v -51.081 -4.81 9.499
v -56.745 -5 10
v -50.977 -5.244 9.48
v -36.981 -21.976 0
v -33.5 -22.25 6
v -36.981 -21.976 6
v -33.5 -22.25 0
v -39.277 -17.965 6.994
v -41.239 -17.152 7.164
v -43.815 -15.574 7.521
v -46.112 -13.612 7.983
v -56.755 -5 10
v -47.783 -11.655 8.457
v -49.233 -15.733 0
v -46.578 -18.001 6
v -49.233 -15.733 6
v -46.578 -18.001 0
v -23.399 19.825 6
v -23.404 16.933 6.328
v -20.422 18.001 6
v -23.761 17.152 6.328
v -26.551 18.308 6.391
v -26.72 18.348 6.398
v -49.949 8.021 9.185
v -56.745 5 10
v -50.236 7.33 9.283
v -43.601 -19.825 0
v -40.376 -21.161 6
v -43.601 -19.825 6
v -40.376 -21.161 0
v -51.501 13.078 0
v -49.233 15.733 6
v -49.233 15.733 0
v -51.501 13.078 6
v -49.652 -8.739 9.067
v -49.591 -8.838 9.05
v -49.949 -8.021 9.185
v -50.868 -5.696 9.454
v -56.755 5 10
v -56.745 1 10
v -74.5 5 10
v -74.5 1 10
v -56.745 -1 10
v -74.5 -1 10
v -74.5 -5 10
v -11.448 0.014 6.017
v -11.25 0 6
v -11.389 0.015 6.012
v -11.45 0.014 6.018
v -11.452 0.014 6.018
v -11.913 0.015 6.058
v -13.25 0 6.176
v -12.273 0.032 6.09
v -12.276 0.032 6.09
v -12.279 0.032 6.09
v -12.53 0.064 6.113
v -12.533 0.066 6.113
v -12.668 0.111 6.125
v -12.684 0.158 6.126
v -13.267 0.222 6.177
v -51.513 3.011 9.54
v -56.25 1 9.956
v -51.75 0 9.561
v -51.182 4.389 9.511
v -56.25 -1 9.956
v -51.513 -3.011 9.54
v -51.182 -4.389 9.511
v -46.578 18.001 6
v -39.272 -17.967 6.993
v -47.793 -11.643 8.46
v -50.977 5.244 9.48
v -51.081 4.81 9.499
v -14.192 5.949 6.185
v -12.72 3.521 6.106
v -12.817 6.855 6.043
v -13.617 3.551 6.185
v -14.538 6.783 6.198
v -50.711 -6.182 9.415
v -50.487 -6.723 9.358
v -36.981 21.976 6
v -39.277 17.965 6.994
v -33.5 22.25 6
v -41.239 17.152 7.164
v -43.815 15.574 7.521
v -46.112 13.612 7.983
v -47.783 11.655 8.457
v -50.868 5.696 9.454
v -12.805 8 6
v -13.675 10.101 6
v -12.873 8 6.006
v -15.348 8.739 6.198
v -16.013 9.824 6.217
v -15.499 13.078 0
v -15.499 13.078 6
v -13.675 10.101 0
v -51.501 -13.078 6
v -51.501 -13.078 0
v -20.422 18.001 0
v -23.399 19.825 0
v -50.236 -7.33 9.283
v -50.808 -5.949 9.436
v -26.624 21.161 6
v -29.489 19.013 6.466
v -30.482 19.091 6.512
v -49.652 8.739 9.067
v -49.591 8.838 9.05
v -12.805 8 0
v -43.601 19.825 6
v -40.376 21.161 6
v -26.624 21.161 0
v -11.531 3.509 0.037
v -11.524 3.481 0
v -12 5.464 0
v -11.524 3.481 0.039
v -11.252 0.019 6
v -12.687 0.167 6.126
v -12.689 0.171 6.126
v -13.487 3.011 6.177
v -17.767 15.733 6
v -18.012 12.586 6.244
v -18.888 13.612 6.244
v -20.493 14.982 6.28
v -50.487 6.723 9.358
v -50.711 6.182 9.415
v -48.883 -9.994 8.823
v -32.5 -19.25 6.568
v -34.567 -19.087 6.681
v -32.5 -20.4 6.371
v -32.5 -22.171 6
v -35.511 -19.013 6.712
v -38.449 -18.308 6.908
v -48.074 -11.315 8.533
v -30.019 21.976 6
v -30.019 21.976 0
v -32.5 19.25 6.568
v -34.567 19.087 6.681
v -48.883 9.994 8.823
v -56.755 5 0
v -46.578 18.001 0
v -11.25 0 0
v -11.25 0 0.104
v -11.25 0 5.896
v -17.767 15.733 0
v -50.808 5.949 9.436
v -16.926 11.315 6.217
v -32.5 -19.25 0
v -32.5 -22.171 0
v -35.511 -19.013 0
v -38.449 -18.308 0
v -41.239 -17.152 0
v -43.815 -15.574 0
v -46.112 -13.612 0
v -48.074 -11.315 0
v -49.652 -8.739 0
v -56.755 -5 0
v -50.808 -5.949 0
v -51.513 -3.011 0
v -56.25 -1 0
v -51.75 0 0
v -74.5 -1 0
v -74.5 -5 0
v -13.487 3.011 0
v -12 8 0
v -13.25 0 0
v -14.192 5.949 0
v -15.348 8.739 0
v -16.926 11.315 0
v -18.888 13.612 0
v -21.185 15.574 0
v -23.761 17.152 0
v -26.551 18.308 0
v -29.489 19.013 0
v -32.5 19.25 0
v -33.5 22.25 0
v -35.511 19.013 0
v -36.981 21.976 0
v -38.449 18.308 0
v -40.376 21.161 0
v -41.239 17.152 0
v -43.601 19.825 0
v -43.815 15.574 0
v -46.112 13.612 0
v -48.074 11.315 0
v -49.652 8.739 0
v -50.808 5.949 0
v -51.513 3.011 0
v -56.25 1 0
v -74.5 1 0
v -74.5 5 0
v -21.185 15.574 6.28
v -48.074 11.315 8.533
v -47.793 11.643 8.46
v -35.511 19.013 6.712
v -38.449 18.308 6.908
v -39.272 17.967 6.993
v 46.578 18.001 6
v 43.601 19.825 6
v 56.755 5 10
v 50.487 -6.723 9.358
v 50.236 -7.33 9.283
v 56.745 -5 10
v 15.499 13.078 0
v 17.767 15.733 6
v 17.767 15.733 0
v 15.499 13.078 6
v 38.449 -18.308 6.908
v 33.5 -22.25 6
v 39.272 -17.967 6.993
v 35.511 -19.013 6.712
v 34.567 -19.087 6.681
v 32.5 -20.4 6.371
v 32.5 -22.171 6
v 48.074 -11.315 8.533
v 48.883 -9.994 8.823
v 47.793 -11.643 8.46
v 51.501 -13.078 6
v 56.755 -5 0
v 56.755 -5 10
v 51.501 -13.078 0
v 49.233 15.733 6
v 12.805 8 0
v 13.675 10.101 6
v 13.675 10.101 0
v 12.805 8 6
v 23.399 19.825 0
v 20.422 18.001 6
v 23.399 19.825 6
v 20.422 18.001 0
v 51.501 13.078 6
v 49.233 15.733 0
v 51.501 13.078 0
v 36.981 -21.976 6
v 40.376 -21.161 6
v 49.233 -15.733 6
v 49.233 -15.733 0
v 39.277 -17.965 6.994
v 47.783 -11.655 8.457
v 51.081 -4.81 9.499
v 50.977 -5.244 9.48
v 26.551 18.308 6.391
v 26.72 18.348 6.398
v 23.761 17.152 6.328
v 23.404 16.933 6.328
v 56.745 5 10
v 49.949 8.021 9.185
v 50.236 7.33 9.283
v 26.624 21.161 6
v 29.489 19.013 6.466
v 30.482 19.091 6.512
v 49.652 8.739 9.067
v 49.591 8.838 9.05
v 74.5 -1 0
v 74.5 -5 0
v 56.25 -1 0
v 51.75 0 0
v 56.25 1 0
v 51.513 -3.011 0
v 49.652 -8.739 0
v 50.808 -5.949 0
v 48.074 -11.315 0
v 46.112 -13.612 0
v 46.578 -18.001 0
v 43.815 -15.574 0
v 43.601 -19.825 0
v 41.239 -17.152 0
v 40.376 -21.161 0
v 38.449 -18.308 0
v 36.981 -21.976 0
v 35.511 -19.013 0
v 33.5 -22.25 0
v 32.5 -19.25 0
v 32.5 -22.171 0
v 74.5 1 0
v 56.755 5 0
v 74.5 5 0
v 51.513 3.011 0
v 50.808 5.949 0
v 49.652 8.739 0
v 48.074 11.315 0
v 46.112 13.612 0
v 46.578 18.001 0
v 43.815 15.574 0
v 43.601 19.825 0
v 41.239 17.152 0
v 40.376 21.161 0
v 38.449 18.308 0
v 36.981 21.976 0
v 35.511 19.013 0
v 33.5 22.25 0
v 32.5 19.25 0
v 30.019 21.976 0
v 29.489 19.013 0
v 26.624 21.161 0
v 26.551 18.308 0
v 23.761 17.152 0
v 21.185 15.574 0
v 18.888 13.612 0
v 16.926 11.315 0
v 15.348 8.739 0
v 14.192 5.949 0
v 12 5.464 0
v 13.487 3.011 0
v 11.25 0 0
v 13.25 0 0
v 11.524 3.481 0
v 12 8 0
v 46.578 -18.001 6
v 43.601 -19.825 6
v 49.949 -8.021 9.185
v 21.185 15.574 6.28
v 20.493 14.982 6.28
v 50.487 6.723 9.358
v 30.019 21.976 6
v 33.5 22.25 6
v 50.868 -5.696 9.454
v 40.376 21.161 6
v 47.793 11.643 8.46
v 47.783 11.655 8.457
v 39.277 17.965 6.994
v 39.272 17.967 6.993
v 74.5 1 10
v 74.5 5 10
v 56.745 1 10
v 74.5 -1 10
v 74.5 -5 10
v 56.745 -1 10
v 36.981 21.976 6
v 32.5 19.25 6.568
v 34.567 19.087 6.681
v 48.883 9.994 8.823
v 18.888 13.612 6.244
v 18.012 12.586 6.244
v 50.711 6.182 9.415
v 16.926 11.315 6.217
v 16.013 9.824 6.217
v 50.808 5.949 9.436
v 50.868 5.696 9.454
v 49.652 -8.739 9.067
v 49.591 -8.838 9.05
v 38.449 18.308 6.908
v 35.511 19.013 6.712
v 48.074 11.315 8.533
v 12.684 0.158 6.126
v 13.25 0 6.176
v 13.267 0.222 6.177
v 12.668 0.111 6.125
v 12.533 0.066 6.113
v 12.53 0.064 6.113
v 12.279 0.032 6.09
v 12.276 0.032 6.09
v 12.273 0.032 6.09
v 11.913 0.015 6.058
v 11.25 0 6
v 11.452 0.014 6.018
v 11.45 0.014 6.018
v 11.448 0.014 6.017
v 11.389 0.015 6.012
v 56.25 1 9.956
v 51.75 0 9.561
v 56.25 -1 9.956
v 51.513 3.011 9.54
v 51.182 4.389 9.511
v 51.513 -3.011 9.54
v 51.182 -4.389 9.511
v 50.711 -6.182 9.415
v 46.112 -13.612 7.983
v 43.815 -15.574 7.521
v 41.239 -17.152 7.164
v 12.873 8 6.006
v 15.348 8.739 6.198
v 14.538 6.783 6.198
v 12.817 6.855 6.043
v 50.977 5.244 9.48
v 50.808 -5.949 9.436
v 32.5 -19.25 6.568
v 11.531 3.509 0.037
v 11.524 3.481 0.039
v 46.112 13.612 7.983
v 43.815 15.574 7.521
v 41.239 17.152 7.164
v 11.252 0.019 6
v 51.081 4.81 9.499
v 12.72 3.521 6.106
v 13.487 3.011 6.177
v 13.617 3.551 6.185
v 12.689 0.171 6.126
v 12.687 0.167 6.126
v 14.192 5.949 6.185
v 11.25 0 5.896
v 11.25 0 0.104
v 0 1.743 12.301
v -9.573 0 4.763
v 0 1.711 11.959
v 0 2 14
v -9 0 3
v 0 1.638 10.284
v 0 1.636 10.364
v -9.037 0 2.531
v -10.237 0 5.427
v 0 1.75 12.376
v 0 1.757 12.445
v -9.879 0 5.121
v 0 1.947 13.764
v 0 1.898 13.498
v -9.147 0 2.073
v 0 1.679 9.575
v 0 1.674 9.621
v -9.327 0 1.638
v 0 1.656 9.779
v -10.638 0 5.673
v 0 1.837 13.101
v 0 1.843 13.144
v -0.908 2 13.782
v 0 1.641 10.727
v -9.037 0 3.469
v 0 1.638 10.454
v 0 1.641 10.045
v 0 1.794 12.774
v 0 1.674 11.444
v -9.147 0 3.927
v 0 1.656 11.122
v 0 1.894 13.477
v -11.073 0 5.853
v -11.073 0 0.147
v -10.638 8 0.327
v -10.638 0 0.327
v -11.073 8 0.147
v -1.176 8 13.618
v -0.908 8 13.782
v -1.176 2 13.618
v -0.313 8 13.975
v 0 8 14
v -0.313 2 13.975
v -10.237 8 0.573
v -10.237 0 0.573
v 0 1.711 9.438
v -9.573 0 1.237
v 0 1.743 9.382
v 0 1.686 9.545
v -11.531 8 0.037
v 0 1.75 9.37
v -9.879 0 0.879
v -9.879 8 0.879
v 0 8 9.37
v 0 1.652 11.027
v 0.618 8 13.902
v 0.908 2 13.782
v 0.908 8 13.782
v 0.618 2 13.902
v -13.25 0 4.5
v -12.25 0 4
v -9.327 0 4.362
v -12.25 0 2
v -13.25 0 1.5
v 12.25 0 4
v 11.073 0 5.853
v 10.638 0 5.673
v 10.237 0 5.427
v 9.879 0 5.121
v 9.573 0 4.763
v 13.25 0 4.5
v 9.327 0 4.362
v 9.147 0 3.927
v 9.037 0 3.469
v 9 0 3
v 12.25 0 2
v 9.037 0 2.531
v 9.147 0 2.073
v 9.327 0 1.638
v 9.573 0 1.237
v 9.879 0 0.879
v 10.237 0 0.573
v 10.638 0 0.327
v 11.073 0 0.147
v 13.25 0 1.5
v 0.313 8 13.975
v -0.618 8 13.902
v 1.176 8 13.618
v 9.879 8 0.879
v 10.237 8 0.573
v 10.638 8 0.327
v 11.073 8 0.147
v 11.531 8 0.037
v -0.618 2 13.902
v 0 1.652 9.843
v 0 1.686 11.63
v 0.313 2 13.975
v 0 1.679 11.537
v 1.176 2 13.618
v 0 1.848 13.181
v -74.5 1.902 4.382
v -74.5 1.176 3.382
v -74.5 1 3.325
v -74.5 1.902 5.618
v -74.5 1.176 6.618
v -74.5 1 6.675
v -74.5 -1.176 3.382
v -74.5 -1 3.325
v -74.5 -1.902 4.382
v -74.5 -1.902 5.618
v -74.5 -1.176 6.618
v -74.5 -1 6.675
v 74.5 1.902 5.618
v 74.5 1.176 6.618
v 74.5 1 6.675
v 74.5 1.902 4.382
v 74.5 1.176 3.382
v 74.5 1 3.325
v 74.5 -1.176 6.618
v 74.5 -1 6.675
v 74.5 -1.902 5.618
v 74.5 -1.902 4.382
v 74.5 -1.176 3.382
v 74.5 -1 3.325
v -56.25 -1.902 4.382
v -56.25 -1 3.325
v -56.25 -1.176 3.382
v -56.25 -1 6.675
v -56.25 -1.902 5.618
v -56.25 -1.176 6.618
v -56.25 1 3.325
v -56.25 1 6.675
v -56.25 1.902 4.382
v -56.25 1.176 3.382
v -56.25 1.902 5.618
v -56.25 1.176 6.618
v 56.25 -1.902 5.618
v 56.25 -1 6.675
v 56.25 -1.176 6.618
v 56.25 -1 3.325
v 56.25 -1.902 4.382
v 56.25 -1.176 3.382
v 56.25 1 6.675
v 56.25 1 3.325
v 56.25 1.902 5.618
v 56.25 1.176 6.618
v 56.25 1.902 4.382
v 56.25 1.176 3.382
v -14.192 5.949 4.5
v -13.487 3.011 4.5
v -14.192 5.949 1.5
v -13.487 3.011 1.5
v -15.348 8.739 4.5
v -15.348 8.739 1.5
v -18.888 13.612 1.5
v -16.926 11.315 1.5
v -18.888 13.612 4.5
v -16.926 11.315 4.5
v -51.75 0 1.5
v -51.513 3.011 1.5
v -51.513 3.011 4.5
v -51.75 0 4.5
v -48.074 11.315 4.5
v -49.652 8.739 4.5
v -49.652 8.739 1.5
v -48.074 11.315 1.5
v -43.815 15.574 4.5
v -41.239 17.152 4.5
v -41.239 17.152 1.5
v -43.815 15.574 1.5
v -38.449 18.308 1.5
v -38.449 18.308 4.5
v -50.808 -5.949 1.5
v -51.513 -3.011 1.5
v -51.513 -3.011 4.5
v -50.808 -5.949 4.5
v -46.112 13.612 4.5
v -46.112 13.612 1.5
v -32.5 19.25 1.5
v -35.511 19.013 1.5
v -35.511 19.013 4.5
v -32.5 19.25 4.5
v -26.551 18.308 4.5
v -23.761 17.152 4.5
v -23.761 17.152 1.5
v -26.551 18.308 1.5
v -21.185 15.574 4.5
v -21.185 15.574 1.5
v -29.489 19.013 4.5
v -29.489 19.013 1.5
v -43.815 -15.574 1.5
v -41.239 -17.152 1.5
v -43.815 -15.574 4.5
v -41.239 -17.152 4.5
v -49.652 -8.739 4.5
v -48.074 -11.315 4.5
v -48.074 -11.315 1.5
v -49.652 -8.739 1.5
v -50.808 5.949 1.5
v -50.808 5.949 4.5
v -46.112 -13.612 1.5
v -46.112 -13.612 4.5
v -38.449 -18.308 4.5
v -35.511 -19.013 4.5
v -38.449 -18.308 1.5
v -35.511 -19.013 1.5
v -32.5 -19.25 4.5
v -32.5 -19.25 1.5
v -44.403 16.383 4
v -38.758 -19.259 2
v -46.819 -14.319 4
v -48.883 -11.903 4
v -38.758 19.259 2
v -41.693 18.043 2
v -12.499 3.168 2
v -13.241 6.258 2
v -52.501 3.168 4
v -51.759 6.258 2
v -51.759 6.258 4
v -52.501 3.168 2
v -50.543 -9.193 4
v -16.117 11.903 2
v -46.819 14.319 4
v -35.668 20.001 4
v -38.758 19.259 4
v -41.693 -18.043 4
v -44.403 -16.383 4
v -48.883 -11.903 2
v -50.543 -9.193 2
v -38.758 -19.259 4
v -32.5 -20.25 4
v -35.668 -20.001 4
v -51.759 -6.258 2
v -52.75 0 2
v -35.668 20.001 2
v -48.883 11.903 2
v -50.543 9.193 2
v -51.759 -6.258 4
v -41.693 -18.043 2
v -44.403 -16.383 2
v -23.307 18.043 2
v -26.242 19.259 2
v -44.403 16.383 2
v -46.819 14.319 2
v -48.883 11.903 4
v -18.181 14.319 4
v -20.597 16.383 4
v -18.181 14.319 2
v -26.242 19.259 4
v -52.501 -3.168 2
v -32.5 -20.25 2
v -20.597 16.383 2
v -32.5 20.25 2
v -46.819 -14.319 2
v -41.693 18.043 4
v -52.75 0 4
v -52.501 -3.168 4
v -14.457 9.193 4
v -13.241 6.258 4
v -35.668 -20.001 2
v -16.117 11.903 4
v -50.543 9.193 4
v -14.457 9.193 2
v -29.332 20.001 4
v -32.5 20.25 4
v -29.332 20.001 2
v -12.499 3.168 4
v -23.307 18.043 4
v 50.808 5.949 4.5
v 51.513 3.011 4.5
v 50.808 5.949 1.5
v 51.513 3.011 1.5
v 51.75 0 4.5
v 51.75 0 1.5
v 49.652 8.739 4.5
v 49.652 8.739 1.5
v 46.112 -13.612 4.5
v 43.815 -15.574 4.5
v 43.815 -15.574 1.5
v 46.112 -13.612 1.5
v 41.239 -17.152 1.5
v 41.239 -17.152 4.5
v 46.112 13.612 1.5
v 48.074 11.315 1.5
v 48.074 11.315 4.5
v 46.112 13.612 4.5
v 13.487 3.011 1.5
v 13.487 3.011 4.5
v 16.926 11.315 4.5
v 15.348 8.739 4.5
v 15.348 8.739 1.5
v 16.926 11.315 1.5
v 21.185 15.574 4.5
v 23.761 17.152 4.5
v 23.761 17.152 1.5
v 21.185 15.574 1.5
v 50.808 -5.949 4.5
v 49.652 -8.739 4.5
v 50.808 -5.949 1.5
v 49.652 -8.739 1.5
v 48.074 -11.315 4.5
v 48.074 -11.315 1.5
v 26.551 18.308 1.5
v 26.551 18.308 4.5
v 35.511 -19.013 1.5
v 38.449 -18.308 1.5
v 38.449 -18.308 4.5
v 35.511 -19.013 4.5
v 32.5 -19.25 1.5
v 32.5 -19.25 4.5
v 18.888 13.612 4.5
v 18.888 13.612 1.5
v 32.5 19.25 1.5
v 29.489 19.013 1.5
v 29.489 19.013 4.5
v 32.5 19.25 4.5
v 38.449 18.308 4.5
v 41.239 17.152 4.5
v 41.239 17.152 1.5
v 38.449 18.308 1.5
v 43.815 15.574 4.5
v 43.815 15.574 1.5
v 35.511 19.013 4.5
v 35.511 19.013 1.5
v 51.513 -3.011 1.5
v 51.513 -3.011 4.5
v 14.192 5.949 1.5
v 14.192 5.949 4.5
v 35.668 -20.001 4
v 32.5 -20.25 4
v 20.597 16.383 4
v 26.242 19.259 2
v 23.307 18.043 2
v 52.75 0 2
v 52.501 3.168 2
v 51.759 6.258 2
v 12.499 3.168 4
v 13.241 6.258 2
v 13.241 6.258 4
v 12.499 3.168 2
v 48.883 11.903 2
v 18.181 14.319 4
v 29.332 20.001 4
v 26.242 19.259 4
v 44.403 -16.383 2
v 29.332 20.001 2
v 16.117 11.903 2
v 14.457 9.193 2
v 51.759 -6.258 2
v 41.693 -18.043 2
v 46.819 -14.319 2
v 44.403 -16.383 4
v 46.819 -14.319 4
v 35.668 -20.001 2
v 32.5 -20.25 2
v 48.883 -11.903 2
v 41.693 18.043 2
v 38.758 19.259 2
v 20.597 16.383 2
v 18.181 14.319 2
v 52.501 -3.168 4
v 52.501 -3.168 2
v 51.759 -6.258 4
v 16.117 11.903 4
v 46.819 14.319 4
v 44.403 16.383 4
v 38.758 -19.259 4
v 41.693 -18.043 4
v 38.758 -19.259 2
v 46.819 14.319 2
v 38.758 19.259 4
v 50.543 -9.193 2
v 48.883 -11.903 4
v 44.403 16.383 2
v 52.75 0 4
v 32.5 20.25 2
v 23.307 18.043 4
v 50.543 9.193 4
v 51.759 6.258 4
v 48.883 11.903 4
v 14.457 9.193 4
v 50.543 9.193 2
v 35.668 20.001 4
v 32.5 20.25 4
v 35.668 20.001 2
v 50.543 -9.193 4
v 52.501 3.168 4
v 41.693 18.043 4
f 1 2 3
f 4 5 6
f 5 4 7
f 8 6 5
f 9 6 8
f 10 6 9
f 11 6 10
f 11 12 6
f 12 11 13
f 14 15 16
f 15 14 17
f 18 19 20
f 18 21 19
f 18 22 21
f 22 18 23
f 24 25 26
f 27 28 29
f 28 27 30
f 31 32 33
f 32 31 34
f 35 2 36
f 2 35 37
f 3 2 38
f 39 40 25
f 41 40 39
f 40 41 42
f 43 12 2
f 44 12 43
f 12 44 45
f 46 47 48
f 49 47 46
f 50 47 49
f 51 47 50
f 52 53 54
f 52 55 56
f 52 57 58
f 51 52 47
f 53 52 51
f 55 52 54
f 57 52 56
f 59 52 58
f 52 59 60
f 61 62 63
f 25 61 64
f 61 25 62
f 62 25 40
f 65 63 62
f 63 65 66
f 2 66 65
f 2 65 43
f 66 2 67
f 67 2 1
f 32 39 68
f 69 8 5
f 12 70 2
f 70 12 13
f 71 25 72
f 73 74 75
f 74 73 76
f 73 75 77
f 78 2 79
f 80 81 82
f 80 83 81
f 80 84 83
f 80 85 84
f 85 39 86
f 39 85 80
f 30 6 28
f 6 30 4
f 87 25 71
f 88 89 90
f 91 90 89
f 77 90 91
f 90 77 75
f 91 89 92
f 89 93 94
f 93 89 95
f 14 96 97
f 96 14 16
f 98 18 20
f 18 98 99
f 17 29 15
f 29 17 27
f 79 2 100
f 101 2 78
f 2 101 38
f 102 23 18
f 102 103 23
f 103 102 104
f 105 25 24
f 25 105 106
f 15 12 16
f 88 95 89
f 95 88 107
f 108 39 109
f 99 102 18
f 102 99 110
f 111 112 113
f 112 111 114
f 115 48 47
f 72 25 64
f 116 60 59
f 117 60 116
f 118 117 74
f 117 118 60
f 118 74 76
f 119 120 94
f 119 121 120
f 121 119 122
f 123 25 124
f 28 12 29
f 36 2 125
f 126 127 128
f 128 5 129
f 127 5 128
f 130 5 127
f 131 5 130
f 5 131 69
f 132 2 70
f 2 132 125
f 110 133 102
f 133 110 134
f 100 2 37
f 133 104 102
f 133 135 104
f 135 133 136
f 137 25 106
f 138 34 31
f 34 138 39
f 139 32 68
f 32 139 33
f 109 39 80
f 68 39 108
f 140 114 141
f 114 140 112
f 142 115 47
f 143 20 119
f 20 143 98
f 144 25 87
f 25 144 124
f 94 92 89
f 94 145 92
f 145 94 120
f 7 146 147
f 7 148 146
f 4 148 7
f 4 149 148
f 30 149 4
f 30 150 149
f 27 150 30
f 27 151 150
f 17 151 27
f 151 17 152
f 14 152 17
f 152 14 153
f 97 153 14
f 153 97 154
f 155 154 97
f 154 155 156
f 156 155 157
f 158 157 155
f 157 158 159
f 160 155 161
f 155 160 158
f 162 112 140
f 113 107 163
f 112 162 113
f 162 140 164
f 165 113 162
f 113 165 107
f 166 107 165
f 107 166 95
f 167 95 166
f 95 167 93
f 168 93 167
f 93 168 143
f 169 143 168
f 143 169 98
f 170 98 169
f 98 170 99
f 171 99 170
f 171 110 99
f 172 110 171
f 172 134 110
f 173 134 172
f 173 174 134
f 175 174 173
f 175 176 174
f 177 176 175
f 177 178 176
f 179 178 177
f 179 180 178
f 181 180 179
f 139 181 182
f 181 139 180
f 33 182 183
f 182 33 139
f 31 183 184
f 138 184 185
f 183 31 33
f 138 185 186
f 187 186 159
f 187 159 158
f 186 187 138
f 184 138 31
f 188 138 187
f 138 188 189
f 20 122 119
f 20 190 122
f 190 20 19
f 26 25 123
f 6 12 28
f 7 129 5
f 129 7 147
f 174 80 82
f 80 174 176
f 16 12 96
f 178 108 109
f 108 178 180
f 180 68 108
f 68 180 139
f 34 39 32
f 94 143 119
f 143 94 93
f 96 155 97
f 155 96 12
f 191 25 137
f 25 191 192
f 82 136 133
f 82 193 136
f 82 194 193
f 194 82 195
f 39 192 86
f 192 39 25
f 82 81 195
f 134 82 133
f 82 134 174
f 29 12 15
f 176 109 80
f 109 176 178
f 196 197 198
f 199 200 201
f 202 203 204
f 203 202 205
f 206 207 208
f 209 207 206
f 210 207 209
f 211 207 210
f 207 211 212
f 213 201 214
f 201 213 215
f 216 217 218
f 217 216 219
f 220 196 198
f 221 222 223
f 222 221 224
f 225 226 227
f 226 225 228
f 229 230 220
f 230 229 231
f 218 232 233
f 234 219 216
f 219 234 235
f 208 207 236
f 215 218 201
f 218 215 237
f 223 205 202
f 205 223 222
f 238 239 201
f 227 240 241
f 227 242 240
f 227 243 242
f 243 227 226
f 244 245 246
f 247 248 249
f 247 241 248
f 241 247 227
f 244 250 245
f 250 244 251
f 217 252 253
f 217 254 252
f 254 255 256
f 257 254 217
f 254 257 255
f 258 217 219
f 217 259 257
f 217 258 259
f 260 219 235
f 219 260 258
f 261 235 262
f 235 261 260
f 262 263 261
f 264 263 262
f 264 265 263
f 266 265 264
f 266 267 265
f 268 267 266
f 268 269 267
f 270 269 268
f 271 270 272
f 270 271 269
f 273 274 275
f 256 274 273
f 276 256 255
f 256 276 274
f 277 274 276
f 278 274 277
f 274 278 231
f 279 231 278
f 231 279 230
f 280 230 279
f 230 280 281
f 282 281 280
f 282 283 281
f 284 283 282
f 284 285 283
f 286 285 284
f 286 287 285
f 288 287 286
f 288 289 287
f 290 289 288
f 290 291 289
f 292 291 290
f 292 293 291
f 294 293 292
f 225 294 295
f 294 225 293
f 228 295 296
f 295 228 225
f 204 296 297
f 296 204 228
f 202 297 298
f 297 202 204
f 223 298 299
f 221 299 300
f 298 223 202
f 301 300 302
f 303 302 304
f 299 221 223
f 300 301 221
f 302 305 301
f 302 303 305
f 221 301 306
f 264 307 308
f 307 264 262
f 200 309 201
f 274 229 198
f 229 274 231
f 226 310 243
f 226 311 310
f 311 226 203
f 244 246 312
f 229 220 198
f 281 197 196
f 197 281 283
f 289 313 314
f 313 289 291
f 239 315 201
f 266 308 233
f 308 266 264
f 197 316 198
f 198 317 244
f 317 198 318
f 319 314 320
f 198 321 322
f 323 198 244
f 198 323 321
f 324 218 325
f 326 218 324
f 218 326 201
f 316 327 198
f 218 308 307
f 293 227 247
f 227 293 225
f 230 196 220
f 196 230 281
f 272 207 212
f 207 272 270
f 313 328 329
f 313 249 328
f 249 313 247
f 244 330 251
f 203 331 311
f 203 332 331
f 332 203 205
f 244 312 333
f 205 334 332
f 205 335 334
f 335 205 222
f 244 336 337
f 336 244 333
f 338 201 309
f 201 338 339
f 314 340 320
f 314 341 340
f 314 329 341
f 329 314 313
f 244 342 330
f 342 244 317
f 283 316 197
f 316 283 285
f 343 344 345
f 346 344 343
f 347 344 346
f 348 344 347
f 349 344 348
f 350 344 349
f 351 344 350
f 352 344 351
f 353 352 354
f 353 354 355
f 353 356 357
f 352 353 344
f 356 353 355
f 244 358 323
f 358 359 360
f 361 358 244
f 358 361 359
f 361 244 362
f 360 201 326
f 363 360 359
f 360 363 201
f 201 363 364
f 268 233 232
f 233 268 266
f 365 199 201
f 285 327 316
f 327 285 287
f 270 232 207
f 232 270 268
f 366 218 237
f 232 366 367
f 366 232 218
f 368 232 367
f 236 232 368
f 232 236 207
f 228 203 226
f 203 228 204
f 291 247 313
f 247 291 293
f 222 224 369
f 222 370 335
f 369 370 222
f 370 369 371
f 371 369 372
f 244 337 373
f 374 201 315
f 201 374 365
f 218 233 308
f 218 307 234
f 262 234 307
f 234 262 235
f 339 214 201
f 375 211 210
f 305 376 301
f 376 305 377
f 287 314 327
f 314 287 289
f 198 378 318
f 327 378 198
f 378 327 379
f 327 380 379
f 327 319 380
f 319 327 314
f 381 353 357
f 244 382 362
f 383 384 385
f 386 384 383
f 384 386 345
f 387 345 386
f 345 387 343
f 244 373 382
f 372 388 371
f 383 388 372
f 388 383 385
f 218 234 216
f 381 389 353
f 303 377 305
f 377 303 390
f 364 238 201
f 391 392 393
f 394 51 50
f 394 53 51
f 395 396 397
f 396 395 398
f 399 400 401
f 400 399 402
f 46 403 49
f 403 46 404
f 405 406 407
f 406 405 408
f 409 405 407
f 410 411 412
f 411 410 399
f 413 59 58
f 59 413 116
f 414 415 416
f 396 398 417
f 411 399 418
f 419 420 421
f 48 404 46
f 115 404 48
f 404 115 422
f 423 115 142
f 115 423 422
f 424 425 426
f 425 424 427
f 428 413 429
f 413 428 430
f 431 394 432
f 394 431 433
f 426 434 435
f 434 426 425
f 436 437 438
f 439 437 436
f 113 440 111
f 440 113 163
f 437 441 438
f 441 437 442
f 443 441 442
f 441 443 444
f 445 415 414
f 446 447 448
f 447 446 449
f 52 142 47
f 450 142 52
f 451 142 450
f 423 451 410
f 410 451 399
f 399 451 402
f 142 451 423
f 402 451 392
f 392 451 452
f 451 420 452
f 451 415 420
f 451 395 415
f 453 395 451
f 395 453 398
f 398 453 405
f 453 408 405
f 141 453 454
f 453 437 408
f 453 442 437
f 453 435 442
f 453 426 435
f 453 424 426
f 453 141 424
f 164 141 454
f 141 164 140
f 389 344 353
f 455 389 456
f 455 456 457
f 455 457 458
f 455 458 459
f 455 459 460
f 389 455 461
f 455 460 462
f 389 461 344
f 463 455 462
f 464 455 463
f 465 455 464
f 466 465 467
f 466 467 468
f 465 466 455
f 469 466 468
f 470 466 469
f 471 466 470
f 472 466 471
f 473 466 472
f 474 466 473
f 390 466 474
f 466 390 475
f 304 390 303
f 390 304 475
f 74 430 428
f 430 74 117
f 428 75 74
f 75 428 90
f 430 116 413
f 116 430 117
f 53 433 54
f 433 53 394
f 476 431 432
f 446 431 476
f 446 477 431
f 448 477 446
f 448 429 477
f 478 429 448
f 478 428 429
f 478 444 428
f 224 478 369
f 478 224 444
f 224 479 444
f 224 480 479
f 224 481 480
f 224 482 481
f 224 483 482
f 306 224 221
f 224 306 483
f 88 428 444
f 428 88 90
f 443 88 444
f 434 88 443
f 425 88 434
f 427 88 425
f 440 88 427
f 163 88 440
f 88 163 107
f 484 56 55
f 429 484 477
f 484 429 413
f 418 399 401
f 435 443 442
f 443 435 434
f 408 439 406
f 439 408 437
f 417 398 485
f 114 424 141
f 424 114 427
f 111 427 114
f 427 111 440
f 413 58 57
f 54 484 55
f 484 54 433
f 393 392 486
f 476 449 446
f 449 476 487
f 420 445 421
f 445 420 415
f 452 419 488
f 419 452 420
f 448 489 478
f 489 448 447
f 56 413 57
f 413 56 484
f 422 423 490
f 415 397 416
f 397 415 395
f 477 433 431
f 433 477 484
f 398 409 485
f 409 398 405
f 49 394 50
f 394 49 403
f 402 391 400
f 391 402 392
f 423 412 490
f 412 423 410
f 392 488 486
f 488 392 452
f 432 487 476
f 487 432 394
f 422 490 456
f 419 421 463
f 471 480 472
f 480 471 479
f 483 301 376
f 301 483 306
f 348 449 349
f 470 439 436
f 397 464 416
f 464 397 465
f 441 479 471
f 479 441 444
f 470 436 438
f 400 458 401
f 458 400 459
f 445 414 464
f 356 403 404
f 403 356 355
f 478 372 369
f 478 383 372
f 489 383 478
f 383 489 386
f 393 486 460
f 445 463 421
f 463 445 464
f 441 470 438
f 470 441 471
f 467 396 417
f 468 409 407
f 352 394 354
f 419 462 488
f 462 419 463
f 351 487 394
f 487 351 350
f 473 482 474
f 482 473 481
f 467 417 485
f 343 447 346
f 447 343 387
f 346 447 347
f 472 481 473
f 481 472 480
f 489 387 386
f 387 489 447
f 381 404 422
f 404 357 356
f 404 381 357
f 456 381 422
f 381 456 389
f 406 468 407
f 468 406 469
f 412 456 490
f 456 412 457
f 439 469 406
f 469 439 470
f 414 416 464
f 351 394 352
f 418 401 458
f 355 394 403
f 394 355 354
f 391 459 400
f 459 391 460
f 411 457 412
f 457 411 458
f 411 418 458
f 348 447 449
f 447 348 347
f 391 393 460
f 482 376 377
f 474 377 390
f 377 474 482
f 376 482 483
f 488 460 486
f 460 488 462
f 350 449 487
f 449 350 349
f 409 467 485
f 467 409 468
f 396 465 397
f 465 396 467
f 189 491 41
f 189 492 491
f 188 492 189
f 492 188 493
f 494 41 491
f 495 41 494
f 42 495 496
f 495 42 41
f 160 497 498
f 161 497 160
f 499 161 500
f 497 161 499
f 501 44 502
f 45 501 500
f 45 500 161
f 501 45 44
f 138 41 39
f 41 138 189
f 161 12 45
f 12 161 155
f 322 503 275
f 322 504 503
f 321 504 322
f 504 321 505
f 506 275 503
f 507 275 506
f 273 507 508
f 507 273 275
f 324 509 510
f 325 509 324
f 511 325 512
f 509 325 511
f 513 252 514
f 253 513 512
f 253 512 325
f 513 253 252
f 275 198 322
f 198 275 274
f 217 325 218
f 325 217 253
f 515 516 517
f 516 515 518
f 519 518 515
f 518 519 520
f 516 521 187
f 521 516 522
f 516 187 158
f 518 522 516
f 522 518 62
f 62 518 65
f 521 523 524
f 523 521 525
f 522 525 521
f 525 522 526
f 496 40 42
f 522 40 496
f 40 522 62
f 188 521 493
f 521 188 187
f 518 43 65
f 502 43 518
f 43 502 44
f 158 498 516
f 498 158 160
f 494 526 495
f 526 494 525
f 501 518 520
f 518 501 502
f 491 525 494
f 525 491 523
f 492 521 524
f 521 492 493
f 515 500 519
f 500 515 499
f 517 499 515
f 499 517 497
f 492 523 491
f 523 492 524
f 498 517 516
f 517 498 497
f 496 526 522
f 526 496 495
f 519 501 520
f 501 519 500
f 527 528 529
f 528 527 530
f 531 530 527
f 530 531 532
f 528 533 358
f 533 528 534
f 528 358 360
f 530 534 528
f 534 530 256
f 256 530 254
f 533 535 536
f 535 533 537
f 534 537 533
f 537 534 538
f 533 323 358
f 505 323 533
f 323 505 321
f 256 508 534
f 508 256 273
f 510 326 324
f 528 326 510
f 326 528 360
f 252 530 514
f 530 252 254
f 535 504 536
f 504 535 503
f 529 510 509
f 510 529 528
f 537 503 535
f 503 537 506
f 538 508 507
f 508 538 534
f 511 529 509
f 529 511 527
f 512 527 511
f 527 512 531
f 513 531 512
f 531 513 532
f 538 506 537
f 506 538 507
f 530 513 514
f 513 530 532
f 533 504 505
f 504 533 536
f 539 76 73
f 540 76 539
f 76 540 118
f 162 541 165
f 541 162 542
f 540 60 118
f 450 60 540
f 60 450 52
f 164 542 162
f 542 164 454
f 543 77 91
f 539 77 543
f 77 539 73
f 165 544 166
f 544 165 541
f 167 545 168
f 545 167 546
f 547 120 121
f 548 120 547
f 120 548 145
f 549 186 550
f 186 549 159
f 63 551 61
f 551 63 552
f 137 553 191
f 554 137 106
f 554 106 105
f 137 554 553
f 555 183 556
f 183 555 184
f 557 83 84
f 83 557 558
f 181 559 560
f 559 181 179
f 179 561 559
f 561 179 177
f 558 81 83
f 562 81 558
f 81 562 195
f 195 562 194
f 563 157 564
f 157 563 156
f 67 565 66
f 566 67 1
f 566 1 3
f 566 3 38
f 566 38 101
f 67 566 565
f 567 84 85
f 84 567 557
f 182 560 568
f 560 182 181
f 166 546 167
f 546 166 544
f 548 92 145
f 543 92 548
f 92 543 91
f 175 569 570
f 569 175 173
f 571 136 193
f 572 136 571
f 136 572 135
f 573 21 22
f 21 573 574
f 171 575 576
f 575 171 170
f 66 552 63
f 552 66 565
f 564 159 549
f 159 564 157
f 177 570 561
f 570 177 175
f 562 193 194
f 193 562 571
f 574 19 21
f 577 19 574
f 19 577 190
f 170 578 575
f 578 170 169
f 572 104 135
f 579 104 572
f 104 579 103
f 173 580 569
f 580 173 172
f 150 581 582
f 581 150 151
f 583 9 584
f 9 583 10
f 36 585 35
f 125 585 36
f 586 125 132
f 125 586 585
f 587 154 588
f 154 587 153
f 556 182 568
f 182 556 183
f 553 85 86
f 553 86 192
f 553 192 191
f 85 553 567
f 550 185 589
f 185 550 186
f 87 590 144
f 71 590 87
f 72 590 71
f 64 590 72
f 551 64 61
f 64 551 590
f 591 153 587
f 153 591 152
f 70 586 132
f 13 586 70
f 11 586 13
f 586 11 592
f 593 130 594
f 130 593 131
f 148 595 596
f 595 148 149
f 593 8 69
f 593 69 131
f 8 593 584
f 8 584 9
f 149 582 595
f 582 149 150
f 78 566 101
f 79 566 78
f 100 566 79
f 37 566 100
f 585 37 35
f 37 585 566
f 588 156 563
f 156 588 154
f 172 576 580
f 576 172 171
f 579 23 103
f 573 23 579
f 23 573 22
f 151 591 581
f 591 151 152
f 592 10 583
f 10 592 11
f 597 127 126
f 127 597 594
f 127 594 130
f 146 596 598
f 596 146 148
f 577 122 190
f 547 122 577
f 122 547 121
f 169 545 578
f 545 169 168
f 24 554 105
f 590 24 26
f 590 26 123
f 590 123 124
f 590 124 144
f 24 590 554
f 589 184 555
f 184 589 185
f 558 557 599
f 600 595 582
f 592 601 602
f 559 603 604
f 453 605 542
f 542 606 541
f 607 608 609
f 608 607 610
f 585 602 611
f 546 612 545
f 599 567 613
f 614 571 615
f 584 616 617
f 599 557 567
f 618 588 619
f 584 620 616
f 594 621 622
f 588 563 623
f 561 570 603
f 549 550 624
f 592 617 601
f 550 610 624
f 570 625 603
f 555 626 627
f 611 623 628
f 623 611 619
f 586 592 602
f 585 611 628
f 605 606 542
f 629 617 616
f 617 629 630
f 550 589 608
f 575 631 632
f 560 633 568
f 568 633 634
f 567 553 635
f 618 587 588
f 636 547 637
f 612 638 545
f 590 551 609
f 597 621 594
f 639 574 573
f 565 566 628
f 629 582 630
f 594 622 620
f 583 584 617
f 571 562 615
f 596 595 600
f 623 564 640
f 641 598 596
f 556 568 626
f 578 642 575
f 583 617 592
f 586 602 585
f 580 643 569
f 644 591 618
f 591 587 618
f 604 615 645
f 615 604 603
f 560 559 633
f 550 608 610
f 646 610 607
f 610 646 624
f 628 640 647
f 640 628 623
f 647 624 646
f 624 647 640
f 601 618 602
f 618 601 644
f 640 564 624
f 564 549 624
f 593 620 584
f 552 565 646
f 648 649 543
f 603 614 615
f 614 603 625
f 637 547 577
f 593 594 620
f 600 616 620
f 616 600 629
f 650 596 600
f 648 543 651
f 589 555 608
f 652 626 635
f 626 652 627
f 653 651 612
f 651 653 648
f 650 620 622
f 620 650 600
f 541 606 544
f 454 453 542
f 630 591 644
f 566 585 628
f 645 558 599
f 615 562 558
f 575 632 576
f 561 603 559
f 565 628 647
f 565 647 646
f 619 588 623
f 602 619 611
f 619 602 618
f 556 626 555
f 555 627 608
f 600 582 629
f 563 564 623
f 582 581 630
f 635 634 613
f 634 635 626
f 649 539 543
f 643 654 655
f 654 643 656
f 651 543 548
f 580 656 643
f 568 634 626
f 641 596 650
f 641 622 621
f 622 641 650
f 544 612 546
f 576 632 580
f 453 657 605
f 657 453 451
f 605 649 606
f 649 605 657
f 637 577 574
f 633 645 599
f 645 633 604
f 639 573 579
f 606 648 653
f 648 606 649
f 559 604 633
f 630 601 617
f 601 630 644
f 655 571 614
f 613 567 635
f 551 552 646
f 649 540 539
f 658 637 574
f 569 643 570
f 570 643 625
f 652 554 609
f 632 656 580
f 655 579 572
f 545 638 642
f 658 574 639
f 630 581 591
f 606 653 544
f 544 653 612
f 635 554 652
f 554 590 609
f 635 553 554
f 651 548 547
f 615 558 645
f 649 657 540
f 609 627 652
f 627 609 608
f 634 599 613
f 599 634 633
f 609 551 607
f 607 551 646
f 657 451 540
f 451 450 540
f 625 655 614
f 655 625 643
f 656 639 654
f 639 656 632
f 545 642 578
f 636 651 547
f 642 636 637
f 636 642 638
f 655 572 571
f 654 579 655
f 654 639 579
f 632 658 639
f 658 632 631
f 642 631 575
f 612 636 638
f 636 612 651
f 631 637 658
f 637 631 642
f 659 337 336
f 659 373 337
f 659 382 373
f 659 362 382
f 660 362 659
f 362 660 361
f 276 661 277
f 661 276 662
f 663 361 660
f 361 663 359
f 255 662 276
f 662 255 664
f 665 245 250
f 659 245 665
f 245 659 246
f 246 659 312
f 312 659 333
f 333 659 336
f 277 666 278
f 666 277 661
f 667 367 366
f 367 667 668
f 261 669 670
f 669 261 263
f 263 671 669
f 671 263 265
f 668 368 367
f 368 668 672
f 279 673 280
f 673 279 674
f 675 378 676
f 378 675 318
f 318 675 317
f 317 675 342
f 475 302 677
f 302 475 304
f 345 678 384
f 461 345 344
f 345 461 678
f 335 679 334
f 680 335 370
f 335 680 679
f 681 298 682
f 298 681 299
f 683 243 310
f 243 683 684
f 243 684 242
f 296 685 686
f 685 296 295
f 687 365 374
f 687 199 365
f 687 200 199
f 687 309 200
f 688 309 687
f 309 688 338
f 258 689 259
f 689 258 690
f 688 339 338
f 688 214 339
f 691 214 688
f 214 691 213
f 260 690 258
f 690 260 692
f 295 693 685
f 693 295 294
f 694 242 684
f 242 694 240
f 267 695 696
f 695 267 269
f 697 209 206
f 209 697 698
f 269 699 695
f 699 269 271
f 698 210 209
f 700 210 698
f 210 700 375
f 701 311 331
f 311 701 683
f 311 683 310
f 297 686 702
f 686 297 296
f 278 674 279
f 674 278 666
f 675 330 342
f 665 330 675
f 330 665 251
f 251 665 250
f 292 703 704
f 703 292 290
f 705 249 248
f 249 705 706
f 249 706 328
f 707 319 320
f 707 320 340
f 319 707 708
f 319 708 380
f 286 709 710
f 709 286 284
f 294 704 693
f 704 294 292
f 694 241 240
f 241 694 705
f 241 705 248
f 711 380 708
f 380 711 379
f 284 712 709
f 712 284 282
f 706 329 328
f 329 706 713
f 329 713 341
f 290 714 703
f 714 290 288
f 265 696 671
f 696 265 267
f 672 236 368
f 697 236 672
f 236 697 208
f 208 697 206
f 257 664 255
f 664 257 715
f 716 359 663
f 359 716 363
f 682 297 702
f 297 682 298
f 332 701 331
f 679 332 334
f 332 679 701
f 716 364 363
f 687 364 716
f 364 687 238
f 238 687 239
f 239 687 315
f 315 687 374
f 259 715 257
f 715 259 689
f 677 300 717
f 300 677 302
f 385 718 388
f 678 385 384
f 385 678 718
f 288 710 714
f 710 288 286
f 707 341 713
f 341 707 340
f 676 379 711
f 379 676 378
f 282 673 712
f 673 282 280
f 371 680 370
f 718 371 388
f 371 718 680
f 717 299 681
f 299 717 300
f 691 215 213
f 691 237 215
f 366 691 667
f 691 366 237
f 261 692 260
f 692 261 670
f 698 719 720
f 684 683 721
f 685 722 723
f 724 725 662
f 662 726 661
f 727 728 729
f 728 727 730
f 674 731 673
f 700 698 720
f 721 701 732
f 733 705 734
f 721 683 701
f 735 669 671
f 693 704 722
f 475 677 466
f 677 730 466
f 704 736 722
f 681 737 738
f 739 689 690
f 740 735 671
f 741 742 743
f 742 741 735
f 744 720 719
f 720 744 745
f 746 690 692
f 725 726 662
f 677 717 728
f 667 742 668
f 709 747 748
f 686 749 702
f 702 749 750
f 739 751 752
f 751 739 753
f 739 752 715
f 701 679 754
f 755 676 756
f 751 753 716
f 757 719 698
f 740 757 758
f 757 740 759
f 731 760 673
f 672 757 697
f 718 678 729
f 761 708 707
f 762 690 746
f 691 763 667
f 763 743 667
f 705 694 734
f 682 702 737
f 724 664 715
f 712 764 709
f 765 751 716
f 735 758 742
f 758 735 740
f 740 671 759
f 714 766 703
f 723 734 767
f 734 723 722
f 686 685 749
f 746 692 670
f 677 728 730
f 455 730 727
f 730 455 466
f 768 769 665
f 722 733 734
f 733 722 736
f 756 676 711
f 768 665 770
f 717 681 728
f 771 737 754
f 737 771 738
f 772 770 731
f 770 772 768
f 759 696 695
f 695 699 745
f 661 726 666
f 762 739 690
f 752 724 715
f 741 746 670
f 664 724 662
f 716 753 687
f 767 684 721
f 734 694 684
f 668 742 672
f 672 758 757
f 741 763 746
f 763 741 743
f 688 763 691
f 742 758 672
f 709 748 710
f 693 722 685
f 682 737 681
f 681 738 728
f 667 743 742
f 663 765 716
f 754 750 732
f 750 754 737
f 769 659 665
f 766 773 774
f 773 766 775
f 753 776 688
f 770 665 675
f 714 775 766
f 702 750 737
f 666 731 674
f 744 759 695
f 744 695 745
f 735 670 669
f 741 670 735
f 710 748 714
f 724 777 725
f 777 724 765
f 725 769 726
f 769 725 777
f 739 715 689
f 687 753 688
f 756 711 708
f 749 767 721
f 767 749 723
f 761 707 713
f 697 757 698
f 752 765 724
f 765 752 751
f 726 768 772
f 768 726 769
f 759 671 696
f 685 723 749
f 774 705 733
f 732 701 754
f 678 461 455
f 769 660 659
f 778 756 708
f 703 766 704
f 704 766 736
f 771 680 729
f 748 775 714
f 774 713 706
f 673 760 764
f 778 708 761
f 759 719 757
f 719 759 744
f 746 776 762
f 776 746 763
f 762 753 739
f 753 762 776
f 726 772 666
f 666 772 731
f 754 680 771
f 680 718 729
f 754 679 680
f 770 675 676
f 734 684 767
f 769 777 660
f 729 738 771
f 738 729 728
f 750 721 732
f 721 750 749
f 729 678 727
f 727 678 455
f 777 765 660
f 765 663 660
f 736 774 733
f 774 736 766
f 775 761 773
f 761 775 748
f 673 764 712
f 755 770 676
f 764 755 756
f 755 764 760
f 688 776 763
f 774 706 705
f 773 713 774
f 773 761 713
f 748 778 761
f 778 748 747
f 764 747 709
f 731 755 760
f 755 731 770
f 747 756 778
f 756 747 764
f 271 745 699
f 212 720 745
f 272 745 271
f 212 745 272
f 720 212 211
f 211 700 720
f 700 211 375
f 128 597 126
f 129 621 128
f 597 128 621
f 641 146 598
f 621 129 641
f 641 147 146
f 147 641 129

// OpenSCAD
// parametric lens holder for Note4 VR OpenDive Headset (and others)

// Single- or Dual- lens model?
part = "single"; // [single:Single Lens,dual:Dual Lens]

// Inter-Pupillary Distance
IPD = 65; // Inter-Pupillary Distance. How far apart the center of the two lenses will be
// Diameter of lens #1 (single and dual)
lensSize1 = 40.5; // diameter of one of the lenses you are using
// Diameter of lens #2 (single and dual)
lensSize2 = 40.5; // diameter of the second lens you are using
// Diameter of lens #3 (dual only)
lensSize3 = 40.5; // diameter of the third lens you are using
// Diameter of lens #4 (dual only)
lensSize4 = 40.5; // diameter of the fourth lens you are using
// Gap between dual lenses (dual only)
lensGap = 11; // gap between first and second lens (center-to-center)
// Width of the VR visor being used.
visorWidth = 149; // outer width of the visor.  this is how wide the lens clip will be
// Width of slots within the VR visor
slotWidth = 10; // how wide the slots for the lens clip are
// Thickness of single lenses
lensThickness = 2; // how thick the edges of the lenses are
// Thickness of secondary lenses
lensThickness2 = 2; // how thick the edges of the secondary lenses are

/* [Hidden] */
$fn=40;
lensLip = 1; // how big the rim of plastic holding the lens in will be
mountStart = (IPD+(lensSize1 + lensSize2)/2)/2 + 4; // an intermediate value
mountMid = (visorWidth/2-mountStart)/2 + mountStart;

lensThicknessAvg = (lensThickness + lensThickness2) / 2; // just to simplify dual
        
lensClip(part);

module lensClip(part)
{
	difference ()
	{
		union()
		{
            // lens outers
            if (part == "single")
            {
                hull()
                {
                    translate([-(IPD/2+1),0,lensThickness/2 + 2])	cylinder(r=lensSize1/2 + 2, h=lensThickness + 4, center=true);
                    translate([-mountStart, 0, 5]) cube([.01, slotWidth, 10], center=true);
                }

                hull()
                {
                    translate([(IPD/2+1),0,lensThickness/2 + 2])	cylinder(r=lensSize2/2 + 2, h=lensThickness +4, center=true);
                    translate([mountStart, 0, 5]) cube([.01, slotWidth, 10], center=true);
                }
            }
            else
            {
                hull()
                {
                    translate([-(IPD/2+1),0,(lensThicknessAvg/2 + 2) + lensGap/2])	cylinder(r=lensSize1/2 + 2, h=(lensThicknessAvg + 4) + lensGap, center=true);
                    translate([-mountStart, 0, 5]) cube([.01, slotWidth, 10], center=true);
                }

                hull()
                {
                    translate([(IPD/2+1),0,(lensThicknessAvg/2 + 2) + lensGap/2])	cylinder(r=lensSize2/2 + 2, h=(lensThicknessAvg + 4) + lensGap, center=true);
                    translate([mountStart, 0, 5]) cube([.01, slotWidth, 10], center=true);
                }
            }
            
            
            translate([-mountMid, 0, 5]) cube([visorWidth/2 - mountStart, slotWidth, 10], center=true);
			translate([mountMid, 0, 5]) cube([visorWidth/2 - mountStart, slotWidth, 10], center=true);
			
			// crosspiece (lighter for single than for dual)
            if (part == "single") 
            {
                hull()
                {
                    translate([0, 5, 12]) rotate([90,0,0]) cylinder(r=2,h=6,center=true);
                    translate([-12, 4, 3]) rotate([90,0,0]) cylinder(r=3,h=8,center=true);
                }
                hull()
                {
                    translate([0, 5, 12]) rotate([90,0,0]) cylinder(r=2,h=6,center=true);
                    translate([12, 4, 3]) rotate([90,0,0]) cylinder(r=3,h=8,center=true);
                }
            }
            else
            {
                hull()
                {
                    translate([0, 5, 12]) rotate([90,0,0]) cylinder(r=3,h=6,center=true);
                    translate([-12.5, 4, 4]) rotate([90,0,0]) cylinder(r=4,h=8,center=true);
                }
                hull()
                {
                    translate([0, 5, 12]) rotate([90,0,0]) cylinder(r=3,h=6,center=true);
                    translate([12.5, 4, 4]) rotate([90,0,0]) cylinder(r=4,h=8,center=true);
                }
            }
			translate([-(IPD/4 + 6),4,3]) cube([IPD/2-12,8,6], center=true);
			translate([(IPD/4 + 6),4,3]) cube([IPD/2-12,8,6], center=true);
		}
	
	// slot mount cutouts
	translate ([-mountMid, 0, 5])
	{
		cube([visorWidth/2 - mountStart + 1, 2, 11],center=true);
		rotate([0,90,0]) cylinder(r=2, h=visorWidth/2 - mountStart + 1, center=true, $fn=10);
	}

	translate ([mountMid, 0, 5])
	{
		cube([visorWidth/2 - mountStart + 1, 2, 11],center=true);
		rotate([0,90,0]) cylinder(r=2, h=visorWidth/2 - mountStart + 1, center=true, $fn=10);
	}
	// lens cutouts
	translate ([-IPD/2,0,lensThickness/2 + 2]) lensCutOut(lensSize1,lensThickness);
	translate ([IPD/2,0,lensThickness/2 + 2]) lensCutOut(lensSize2,lensThickness);
    
    // secondary lens cutouts
    if (part == "dual")
    {
        translate ([-IPD/2,0,(lensThickness/2 + 2) + lensGap]) lensCutOut(lensSize3,lensThickness2);
        translate ([IPD/2,0,(lensThickness/2 + 2) + lensGap]) lensCutOut(lensSize4,lensThickness2);
    }
	
	// lens gap
	translate([0,-50,3]) cube([IPD,100,50], center=true);

	}
}

module lensCutOut(lensSize,lensThickness)
{
	union()
	{
		cylinder(r=lensSize/2 - lensLip, h=100, center=true);
		
		// creating a bevel
		hull()
		{
			cylinder(r=lensSize/2, h=lensThickness, center=true);
			cylinder(r=lensSize/2-lensLip, h=lensThickness + lensLip, center=true);
		}
	}
}
